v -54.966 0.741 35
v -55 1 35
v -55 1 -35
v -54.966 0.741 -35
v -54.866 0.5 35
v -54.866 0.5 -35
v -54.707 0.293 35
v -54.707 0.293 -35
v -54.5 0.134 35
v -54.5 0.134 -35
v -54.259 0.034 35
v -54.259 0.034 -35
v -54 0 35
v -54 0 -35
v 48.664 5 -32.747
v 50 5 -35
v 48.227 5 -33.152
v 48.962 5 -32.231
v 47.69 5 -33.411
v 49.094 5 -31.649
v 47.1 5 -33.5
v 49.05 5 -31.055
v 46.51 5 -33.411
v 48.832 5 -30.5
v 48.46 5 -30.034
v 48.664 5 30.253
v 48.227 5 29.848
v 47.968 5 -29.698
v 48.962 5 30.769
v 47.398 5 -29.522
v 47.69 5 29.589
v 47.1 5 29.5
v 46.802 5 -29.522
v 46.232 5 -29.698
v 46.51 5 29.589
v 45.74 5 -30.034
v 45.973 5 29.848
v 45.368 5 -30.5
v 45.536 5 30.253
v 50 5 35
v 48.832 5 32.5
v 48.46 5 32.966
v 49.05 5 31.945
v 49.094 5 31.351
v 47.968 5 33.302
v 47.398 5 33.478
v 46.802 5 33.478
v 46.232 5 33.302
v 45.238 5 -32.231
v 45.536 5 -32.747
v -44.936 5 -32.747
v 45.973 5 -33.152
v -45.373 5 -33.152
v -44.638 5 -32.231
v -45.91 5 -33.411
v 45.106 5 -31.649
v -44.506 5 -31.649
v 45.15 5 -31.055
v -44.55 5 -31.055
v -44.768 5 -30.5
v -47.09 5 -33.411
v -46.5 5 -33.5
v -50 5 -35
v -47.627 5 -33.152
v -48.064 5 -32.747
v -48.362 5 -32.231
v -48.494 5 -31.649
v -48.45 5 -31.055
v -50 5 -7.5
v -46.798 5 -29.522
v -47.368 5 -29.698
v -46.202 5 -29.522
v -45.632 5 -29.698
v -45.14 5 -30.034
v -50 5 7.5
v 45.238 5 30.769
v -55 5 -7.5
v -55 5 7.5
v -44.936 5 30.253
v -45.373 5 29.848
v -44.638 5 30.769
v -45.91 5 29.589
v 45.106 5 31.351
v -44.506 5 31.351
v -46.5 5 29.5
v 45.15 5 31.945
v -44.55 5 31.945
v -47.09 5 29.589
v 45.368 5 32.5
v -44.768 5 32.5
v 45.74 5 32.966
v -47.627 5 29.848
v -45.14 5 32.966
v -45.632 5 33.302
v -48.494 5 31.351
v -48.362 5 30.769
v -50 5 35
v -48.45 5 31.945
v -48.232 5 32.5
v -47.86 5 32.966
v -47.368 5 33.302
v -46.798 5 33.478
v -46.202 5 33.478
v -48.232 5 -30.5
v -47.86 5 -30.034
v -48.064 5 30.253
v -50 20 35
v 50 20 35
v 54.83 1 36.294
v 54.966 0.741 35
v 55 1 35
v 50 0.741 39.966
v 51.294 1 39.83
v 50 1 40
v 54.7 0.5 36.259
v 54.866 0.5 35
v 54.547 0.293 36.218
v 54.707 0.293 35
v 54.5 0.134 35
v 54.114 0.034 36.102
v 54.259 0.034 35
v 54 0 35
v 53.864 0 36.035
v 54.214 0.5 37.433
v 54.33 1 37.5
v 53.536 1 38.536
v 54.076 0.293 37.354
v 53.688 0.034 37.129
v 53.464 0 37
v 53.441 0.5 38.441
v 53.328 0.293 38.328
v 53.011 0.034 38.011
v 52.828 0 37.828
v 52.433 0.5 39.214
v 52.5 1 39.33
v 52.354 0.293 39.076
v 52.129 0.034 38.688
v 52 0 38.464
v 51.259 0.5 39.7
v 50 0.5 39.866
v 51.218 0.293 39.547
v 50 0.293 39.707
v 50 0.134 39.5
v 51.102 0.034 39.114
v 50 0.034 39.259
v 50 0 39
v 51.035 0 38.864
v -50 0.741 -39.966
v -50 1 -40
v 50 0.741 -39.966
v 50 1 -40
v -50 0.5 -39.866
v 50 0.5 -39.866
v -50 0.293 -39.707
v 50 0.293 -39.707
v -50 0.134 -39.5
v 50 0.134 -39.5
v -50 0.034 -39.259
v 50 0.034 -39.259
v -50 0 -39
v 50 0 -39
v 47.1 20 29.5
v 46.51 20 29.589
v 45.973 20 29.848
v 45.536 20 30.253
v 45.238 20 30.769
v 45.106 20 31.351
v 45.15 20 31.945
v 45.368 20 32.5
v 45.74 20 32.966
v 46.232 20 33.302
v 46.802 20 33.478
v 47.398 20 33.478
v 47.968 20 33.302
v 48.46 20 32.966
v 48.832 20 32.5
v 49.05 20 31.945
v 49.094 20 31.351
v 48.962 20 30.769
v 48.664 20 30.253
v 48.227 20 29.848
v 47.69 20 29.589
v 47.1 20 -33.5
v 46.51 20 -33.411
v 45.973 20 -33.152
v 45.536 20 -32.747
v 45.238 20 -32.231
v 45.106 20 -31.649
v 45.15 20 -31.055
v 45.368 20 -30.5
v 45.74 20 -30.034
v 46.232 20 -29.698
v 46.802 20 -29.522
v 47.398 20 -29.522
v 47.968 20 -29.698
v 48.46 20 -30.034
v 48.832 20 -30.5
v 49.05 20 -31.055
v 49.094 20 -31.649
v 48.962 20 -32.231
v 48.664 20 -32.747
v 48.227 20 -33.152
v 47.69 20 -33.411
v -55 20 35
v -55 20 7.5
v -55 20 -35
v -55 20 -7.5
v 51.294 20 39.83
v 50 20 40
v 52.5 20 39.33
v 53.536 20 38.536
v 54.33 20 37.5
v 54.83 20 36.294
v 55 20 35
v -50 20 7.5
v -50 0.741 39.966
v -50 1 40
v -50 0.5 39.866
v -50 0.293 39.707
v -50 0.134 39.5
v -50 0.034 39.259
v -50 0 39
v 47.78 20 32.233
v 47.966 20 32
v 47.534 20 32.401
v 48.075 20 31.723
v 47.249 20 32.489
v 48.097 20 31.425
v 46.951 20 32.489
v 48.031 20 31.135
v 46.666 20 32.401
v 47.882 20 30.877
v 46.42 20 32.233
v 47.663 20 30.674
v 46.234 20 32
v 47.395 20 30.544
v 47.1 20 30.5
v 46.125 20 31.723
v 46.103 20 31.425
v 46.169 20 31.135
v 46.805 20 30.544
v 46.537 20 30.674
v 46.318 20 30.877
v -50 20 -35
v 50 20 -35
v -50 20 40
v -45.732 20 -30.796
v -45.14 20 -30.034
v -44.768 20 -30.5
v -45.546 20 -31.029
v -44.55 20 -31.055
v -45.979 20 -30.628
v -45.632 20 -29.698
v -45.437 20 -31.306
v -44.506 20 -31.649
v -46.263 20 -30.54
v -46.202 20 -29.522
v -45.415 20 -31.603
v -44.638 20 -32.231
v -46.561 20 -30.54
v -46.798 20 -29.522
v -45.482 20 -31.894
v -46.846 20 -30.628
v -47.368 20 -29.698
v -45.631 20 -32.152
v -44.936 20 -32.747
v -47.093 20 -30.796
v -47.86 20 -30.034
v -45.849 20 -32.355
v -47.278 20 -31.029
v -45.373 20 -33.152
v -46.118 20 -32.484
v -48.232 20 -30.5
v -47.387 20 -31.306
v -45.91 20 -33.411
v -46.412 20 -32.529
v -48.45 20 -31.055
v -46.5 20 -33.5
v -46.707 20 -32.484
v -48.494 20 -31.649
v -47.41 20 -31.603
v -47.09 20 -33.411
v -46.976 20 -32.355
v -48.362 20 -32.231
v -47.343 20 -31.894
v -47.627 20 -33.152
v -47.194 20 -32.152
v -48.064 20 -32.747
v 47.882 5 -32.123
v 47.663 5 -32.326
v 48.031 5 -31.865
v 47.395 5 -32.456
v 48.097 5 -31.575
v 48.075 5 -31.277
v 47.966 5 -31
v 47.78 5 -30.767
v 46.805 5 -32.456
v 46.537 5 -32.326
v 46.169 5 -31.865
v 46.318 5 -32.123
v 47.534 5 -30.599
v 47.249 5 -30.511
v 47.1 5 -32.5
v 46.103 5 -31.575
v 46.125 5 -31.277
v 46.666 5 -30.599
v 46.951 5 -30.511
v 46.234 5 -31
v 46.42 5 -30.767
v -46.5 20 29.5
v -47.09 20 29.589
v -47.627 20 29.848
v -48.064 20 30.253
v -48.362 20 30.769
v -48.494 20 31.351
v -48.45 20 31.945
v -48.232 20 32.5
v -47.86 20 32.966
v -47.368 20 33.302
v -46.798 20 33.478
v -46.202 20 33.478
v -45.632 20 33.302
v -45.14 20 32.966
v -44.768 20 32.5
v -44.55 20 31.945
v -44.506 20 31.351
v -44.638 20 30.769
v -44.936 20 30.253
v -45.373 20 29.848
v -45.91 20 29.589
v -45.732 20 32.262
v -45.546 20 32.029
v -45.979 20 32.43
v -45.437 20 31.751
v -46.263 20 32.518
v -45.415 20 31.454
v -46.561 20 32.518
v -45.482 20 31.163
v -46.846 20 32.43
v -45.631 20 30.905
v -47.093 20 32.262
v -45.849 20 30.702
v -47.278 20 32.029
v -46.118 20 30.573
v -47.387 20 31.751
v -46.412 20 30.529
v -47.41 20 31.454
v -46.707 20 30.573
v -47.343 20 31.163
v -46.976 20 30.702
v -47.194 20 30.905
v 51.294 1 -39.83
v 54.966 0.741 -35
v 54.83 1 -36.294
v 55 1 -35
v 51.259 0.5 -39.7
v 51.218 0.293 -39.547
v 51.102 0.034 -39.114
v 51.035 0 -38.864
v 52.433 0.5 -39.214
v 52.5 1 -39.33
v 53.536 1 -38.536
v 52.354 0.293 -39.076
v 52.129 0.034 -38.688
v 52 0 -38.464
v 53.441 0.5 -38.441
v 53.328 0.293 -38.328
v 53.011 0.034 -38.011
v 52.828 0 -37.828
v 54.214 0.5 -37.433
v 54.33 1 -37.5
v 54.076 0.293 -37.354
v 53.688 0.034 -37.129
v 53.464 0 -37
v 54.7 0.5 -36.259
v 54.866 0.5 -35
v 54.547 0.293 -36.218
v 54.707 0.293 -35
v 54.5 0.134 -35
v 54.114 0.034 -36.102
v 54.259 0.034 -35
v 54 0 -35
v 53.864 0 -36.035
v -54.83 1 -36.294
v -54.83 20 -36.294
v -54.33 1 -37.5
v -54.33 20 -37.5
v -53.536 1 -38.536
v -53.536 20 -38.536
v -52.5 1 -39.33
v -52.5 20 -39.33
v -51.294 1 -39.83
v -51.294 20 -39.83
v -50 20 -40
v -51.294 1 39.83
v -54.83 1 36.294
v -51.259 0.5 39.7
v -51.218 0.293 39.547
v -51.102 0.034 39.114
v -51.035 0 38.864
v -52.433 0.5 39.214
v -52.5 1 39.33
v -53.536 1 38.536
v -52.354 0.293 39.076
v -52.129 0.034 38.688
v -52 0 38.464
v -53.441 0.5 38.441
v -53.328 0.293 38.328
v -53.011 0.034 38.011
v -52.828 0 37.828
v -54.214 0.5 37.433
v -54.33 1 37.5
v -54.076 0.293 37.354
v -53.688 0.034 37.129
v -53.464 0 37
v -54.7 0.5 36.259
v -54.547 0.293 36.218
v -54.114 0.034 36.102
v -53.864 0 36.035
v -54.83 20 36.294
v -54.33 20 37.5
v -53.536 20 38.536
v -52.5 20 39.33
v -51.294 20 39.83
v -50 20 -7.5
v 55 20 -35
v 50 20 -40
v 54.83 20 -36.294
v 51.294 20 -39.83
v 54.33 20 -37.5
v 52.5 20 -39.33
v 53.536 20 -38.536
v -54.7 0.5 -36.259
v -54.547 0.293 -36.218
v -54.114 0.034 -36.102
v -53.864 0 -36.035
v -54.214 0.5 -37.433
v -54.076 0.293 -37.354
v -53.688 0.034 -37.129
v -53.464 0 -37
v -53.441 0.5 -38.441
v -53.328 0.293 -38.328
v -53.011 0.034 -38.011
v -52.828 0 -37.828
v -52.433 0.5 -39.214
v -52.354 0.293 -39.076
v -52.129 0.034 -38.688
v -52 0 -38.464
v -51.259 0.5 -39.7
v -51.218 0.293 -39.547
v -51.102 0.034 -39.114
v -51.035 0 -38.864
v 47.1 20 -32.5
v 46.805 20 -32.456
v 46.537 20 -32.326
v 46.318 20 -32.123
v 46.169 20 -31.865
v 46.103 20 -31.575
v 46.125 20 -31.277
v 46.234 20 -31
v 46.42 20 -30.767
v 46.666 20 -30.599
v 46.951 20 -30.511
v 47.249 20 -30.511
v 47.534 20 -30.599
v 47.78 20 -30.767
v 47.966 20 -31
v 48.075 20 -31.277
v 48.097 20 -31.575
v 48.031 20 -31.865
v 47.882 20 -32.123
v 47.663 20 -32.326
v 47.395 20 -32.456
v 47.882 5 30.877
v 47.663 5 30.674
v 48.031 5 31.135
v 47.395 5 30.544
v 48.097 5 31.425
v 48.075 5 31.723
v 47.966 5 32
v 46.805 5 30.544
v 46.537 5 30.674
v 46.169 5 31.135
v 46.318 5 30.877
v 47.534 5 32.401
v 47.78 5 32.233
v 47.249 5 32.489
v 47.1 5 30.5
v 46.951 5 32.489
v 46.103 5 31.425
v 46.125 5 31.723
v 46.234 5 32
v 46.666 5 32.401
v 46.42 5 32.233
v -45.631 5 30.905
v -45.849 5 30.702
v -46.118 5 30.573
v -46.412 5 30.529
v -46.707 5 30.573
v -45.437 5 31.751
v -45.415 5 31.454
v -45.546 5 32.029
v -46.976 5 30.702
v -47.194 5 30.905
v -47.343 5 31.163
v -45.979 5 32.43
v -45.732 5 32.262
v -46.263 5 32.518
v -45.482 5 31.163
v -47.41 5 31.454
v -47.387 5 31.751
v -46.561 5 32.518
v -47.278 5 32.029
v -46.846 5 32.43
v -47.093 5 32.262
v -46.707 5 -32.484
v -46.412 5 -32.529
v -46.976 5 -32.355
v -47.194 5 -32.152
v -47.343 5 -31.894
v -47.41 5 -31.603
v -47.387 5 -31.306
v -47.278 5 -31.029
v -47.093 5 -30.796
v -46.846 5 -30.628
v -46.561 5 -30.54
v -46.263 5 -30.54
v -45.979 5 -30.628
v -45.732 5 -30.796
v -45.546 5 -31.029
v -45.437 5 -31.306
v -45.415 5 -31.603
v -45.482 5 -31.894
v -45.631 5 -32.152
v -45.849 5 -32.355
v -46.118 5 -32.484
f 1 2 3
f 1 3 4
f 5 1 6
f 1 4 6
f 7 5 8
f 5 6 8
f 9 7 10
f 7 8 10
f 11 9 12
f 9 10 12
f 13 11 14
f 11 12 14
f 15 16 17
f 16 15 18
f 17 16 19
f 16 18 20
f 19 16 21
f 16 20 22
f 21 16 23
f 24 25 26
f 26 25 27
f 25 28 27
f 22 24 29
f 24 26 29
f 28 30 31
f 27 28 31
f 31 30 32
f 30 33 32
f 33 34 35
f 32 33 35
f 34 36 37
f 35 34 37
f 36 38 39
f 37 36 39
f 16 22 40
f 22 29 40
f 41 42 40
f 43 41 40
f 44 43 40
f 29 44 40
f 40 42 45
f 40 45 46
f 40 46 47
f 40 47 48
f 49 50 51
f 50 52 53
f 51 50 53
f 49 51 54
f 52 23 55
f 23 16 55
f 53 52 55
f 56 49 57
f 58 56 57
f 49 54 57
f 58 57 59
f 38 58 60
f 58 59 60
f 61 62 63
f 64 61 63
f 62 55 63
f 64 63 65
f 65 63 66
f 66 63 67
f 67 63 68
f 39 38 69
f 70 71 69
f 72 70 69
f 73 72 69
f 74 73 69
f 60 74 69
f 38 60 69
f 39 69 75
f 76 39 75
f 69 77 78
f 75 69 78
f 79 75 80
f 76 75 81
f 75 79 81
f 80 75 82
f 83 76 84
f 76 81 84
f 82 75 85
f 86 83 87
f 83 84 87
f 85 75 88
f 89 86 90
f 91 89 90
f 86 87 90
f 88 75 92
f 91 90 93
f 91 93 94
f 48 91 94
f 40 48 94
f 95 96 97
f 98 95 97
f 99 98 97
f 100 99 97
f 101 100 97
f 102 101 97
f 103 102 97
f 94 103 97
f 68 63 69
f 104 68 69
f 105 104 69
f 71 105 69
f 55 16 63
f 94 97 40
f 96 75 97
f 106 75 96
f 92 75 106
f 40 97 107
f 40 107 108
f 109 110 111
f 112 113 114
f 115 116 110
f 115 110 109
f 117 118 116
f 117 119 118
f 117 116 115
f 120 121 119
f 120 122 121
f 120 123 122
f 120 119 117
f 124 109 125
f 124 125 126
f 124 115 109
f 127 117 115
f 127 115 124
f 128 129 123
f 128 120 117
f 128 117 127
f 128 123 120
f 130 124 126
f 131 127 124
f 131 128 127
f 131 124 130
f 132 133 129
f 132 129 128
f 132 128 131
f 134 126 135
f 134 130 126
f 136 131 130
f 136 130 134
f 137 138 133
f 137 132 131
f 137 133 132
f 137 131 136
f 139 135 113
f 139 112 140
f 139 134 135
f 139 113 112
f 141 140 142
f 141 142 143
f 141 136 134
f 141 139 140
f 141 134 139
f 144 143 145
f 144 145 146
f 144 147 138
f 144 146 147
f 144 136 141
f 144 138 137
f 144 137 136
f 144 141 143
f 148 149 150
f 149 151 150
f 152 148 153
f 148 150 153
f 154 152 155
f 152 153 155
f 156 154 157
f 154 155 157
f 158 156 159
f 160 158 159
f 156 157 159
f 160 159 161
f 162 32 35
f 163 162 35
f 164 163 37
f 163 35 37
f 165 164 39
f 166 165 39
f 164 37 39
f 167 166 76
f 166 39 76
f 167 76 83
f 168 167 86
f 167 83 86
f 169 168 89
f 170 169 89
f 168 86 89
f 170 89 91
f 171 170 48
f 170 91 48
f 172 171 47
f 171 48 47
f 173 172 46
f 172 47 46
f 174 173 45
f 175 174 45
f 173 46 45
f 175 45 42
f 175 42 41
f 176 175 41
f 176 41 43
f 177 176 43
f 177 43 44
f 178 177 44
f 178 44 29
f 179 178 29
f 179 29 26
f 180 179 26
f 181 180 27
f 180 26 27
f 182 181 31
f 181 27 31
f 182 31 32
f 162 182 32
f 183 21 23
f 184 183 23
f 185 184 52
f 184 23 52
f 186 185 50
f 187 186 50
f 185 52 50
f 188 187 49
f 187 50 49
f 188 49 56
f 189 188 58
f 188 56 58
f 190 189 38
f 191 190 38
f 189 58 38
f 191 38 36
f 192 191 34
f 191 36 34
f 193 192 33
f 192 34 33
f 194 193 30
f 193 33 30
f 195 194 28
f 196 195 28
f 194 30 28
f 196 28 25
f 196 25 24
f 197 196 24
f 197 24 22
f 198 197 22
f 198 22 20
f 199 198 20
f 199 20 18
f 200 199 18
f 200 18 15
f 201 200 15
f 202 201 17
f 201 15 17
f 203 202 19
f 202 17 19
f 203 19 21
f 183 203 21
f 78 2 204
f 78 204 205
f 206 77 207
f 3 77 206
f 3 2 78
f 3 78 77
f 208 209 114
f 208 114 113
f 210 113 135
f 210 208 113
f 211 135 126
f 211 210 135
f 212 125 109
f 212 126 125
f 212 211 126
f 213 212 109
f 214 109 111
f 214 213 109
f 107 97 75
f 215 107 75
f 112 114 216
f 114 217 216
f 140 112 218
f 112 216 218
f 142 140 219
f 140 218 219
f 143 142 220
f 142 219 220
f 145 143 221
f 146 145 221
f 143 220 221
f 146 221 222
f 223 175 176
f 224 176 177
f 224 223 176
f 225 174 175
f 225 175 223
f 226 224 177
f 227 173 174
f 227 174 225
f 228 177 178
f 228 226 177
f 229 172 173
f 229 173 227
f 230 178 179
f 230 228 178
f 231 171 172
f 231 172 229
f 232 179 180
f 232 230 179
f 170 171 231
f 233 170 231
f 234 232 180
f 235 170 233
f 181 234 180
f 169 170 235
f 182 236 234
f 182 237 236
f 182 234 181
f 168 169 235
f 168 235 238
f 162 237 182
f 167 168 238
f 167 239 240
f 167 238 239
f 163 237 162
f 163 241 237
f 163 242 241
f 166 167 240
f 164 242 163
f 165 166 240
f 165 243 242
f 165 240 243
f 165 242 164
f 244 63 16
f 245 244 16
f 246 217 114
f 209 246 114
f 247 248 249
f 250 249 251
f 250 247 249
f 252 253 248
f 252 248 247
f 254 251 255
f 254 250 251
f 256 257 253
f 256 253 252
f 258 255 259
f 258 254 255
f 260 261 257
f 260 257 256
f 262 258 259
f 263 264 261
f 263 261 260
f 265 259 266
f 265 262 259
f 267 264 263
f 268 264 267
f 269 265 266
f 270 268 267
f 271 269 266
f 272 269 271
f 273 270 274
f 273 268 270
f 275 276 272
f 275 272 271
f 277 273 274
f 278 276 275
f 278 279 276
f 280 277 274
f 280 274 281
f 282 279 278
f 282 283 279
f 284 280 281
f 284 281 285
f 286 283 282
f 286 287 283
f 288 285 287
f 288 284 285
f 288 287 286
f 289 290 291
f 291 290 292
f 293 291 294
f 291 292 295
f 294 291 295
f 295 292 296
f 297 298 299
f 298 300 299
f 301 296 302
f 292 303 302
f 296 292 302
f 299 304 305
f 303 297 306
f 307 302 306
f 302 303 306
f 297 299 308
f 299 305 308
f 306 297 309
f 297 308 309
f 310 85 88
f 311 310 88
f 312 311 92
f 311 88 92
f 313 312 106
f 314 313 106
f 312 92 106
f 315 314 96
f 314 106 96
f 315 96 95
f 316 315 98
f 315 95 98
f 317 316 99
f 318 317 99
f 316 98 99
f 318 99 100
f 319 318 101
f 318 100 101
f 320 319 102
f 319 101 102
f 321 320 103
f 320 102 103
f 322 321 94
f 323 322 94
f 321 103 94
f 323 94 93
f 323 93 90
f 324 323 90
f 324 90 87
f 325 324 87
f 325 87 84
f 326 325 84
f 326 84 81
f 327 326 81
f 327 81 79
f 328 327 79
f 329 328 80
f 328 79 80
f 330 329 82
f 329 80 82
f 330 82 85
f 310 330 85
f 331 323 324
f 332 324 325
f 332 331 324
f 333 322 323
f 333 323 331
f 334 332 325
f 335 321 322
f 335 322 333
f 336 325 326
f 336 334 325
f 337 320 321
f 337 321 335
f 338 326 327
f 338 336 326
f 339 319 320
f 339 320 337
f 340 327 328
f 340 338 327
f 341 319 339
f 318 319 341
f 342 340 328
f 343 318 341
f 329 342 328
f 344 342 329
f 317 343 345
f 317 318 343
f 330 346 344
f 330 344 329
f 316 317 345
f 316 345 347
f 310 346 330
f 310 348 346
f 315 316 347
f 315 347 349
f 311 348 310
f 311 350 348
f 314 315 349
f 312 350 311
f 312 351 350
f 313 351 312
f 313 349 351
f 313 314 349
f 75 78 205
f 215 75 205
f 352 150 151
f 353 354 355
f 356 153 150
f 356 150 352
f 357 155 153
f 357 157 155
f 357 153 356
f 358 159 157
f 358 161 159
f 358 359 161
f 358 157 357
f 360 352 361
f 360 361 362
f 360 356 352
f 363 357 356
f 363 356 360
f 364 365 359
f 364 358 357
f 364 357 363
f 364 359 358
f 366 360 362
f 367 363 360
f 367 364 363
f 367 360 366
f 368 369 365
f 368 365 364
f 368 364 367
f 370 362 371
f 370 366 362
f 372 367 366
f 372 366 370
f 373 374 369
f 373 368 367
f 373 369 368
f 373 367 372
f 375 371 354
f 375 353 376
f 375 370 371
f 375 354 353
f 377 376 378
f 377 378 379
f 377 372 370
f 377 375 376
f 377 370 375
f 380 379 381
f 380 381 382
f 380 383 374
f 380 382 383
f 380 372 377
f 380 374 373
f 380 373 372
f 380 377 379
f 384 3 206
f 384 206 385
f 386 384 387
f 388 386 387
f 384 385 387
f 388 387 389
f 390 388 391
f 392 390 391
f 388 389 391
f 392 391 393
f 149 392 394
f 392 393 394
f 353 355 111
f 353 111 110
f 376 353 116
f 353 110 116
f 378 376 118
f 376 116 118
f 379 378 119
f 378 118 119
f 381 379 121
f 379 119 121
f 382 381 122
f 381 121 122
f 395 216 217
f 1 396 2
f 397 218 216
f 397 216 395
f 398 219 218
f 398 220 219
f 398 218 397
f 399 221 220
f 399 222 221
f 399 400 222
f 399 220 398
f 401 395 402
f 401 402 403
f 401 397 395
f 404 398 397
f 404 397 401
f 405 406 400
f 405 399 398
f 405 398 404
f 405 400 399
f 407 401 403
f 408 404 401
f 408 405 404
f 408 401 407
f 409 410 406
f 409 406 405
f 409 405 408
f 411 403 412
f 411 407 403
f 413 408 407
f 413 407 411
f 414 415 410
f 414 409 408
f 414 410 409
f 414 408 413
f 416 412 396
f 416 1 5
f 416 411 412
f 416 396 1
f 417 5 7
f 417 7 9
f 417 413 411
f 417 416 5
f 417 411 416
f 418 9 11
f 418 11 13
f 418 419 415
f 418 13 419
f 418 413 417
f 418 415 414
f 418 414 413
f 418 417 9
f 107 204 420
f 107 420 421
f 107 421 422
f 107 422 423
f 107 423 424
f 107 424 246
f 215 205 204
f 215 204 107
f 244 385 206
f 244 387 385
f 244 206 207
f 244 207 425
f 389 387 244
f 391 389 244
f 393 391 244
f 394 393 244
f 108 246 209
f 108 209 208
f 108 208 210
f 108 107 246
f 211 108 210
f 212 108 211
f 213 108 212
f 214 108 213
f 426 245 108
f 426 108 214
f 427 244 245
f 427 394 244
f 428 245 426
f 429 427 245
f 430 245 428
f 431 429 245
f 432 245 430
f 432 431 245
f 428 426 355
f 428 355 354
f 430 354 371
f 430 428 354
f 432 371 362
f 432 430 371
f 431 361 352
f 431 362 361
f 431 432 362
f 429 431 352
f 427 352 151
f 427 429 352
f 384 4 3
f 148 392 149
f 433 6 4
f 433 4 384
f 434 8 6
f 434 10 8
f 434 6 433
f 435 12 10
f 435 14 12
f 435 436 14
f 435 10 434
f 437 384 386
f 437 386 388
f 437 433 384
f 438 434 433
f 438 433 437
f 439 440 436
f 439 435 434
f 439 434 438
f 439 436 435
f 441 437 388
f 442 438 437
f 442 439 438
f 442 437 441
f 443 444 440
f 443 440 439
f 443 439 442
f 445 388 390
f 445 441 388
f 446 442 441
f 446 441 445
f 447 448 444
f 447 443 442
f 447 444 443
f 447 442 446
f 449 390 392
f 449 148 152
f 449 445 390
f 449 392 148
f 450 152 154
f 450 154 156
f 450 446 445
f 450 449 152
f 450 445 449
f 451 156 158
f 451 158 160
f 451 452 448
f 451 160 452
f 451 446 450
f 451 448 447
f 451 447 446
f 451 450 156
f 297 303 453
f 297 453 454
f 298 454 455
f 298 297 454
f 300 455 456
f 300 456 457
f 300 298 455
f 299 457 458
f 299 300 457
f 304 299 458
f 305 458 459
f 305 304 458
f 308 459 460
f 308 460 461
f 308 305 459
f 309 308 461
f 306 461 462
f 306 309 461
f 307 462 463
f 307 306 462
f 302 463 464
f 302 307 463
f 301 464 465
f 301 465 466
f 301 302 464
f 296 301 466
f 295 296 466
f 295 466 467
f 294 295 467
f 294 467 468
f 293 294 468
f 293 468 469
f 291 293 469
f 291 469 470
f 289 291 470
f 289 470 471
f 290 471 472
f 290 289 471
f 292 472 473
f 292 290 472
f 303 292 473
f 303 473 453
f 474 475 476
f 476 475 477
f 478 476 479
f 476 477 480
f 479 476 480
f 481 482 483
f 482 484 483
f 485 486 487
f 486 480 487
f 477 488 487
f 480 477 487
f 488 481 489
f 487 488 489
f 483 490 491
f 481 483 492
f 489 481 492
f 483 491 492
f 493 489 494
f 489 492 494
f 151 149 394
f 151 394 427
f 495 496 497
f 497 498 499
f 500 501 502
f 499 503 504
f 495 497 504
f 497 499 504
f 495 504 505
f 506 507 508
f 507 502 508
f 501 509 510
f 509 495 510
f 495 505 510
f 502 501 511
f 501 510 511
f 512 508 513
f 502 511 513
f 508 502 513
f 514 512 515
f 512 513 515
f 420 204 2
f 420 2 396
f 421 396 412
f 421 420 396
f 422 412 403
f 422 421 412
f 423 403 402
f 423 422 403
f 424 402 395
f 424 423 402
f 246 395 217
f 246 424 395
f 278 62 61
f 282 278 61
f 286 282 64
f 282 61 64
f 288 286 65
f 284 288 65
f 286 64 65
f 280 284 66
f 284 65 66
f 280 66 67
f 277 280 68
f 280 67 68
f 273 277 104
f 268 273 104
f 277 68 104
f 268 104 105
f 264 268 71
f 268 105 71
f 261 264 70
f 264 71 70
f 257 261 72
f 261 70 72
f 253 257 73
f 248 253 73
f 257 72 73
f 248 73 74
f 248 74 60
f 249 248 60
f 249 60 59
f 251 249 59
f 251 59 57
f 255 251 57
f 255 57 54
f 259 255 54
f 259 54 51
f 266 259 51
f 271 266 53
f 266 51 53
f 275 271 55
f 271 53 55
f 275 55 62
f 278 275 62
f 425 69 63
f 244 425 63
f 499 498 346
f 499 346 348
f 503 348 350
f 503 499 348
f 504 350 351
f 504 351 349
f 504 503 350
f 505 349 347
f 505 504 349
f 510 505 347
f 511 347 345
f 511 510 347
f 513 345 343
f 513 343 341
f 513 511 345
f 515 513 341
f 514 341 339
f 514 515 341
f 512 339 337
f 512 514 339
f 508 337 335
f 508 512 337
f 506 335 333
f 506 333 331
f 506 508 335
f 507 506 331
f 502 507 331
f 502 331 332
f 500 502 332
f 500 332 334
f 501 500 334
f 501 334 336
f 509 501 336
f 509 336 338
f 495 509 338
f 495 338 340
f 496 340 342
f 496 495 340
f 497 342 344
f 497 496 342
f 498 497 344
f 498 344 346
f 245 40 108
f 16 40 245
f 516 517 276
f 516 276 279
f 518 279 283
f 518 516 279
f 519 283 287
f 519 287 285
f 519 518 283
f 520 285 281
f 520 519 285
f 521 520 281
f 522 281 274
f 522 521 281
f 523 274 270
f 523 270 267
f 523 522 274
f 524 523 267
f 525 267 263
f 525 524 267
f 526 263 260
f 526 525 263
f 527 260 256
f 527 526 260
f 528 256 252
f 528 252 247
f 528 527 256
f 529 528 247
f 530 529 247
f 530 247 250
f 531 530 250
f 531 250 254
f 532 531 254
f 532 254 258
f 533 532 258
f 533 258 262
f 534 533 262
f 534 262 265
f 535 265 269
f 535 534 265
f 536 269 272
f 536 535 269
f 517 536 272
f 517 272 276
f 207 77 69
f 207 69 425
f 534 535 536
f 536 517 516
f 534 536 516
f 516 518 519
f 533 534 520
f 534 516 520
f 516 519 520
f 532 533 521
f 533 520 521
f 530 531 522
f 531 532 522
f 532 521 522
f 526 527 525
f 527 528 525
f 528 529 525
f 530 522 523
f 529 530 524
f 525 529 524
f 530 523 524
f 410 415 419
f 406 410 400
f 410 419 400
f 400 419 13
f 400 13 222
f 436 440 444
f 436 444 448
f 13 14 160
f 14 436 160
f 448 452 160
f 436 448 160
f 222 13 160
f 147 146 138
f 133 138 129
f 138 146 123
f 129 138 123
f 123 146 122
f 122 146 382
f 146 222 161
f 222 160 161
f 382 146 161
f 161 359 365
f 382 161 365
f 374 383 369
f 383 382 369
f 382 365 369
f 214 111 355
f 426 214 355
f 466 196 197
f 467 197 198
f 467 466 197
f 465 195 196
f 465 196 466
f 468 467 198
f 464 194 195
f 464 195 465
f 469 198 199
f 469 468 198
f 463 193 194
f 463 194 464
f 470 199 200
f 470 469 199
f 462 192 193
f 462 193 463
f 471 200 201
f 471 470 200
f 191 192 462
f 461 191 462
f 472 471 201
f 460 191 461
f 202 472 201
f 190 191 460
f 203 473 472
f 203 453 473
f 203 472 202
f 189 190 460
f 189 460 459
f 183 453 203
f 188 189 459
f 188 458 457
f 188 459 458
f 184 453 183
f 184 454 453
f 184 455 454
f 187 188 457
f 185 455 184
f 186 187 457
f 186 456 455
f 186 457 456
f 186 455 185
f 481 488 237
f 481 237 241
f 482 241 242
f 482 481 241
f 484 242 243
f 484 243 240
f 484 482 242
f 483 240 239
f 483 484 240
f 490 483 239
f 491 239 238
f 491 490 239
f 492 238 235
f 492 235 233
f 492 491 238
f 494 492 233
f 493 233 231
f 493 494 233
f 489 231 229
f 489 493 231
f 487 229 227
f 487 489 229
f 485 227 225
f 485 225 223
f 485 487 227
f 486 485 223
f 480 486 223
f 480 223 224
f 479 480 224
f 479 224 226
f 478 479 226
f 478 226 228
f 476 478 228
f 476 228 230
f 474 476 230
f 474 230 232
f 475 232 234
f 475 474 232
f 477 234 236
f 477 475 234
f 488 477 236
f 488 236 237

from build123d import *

# Parameters (mm, degrees)
SKETCH4_W           = 110
SKETCH4_H           = 80
BOSS_EXTRUDE1_DEPTH = 20
SHELL1_T            = -5
FILLET1_R           = 5
SKETCH8_W           = 15
SKETCH8_H           = 15
CUT_EXTRUDE2_DEPTH  = 5
SKETCH10_R          = 2
SKETCH10_R_2        = 1
BOSS_EXTRUDE2_DEPTH = 15
FILLET2_R           = 1


with BuildPart() as part:
    # Sketch4 → Boss-Extrude1 (new body)
    with BuildSketch(Plane(origin=(0, 0, 0), x_dir=(1, 0, 0), z_dir=(0, 1, 0))):
        Rectangle(SKETCH4_W, SKETCH4_H)
    extrude(amount=BOSS_EXTRUDE1_DEPTH)

    # Shell1
    shell1_openings = [part.faces().sort_by_distance(p)[0] for p in [
        (0, 20, 0),
    ]]
    offset(amount=SHELL1_T, openings=shell1_openings, kind=Kind.INTERSECTION)

    # Fillet1
    fillet1_edges = [part.edges().sort_by_distance(p)[0] for p in [
        (55, 10, 40),
        (-55, 10, 40),
        (-55, 10, -40),
        (55, 10, -40),
    ]]
    fillet(fillet1_edges, radius=FILLET1_R)

    # Sketch8 → Cut-Extrude2 (cut)
    with BuildSketch(Plane.ZY.offset(55)):
        with Locations((0, 12.5)):
            Rectangle(SKETCH8_W, SKETCH8_H)
    extrude(amount=-CUT_EXTRUDE2_DEPTH, mode=Mode.SUBTRACT)

    # Sketch10 → Boss-Extrude2 (add)
    # profile 1 of 4: a face of its own
    with BuildSketch(Plane(origin=(0, 5, 0), x_dir=(1, 0, 0), z_dir=(0, 1, 0))):
        with Locations(Location((47.1, 31.5, 0), (0, 0, 90))):
            Circle(SKETCH10_R)
        with Locations(Location((47.1, 31.5, 0), (0, 0, 90))):
            Circle(SKETCH10_R_2, mode=Mode.SUBTRACT)
    # profile 2 of 4: a face of its own
    with BuildSketch(Plane(origin=(0, 5, 0), x_dir=(1, 0, 0), z_dir=(0, 1, 0))):
        with Locations(Location((47.1, -31.5, 0), (0, 0, 90))):
            Circle(SKETCH10_R)
        with Locations(Location((47.1, -31.5, 0), (0, 0, 90))):
            Circle(SKETCH10_R_2, mode=Mode.SUBTRACT)
    # profile 3 of 4: a face of its own
    with BuildSketch(Plane(origin=(0, 5, 0), x_dir=(1, 0, 0), z_dir=(0, 1, 0))):
        with Locations(Location((-46.5, 31.5, 0), (0, 0, 90))):
            Circle(SKETCH10_R)
        with Locations(Location((-46.412417336, 31.528728885, 0), (0, 0, 90))):
            Circle(SKETCH10_R_2, mode=Mode.SUBTRACT)
    # profile 4 of 4: a face of its own
    with BuildSketch(Plane(origin=(0, 5, 0), x_dir=(1, 0, 0), z_dir=(0, 1, 0))):
        with Locations(Location((-46.5, -31.5, 0), (0, 0, 90))):
            Circle(SKETCH10_R)
        with Locations(Location((-46.412417336, -31.528728885, 0), (0, 0, 90))):
            Circle(SKETCH10_R_2, mode=Mode.SUBTRACT)
    extrude(amount=BOSS_EXTRUDE2_DEPTH)

    # Fillet2
    fillet2_edges = [part.edges().sort_by_distance(p)[0] for p in [
        (-55, 0, 0),
        (55, 0, 0),
        (0, 0, 40),
        (0, 0, -40),
        (-53.535533906, 0, 38.535533906),
        (53.535533906, 0, 38.535533906),
        (53.535533906, 0, -38.535533906),
        (-53.535533906, 0, -38.535533906),
    ]]
    fillet(fillet2_edges, radius=FILLET2_R)


solid = part.part
